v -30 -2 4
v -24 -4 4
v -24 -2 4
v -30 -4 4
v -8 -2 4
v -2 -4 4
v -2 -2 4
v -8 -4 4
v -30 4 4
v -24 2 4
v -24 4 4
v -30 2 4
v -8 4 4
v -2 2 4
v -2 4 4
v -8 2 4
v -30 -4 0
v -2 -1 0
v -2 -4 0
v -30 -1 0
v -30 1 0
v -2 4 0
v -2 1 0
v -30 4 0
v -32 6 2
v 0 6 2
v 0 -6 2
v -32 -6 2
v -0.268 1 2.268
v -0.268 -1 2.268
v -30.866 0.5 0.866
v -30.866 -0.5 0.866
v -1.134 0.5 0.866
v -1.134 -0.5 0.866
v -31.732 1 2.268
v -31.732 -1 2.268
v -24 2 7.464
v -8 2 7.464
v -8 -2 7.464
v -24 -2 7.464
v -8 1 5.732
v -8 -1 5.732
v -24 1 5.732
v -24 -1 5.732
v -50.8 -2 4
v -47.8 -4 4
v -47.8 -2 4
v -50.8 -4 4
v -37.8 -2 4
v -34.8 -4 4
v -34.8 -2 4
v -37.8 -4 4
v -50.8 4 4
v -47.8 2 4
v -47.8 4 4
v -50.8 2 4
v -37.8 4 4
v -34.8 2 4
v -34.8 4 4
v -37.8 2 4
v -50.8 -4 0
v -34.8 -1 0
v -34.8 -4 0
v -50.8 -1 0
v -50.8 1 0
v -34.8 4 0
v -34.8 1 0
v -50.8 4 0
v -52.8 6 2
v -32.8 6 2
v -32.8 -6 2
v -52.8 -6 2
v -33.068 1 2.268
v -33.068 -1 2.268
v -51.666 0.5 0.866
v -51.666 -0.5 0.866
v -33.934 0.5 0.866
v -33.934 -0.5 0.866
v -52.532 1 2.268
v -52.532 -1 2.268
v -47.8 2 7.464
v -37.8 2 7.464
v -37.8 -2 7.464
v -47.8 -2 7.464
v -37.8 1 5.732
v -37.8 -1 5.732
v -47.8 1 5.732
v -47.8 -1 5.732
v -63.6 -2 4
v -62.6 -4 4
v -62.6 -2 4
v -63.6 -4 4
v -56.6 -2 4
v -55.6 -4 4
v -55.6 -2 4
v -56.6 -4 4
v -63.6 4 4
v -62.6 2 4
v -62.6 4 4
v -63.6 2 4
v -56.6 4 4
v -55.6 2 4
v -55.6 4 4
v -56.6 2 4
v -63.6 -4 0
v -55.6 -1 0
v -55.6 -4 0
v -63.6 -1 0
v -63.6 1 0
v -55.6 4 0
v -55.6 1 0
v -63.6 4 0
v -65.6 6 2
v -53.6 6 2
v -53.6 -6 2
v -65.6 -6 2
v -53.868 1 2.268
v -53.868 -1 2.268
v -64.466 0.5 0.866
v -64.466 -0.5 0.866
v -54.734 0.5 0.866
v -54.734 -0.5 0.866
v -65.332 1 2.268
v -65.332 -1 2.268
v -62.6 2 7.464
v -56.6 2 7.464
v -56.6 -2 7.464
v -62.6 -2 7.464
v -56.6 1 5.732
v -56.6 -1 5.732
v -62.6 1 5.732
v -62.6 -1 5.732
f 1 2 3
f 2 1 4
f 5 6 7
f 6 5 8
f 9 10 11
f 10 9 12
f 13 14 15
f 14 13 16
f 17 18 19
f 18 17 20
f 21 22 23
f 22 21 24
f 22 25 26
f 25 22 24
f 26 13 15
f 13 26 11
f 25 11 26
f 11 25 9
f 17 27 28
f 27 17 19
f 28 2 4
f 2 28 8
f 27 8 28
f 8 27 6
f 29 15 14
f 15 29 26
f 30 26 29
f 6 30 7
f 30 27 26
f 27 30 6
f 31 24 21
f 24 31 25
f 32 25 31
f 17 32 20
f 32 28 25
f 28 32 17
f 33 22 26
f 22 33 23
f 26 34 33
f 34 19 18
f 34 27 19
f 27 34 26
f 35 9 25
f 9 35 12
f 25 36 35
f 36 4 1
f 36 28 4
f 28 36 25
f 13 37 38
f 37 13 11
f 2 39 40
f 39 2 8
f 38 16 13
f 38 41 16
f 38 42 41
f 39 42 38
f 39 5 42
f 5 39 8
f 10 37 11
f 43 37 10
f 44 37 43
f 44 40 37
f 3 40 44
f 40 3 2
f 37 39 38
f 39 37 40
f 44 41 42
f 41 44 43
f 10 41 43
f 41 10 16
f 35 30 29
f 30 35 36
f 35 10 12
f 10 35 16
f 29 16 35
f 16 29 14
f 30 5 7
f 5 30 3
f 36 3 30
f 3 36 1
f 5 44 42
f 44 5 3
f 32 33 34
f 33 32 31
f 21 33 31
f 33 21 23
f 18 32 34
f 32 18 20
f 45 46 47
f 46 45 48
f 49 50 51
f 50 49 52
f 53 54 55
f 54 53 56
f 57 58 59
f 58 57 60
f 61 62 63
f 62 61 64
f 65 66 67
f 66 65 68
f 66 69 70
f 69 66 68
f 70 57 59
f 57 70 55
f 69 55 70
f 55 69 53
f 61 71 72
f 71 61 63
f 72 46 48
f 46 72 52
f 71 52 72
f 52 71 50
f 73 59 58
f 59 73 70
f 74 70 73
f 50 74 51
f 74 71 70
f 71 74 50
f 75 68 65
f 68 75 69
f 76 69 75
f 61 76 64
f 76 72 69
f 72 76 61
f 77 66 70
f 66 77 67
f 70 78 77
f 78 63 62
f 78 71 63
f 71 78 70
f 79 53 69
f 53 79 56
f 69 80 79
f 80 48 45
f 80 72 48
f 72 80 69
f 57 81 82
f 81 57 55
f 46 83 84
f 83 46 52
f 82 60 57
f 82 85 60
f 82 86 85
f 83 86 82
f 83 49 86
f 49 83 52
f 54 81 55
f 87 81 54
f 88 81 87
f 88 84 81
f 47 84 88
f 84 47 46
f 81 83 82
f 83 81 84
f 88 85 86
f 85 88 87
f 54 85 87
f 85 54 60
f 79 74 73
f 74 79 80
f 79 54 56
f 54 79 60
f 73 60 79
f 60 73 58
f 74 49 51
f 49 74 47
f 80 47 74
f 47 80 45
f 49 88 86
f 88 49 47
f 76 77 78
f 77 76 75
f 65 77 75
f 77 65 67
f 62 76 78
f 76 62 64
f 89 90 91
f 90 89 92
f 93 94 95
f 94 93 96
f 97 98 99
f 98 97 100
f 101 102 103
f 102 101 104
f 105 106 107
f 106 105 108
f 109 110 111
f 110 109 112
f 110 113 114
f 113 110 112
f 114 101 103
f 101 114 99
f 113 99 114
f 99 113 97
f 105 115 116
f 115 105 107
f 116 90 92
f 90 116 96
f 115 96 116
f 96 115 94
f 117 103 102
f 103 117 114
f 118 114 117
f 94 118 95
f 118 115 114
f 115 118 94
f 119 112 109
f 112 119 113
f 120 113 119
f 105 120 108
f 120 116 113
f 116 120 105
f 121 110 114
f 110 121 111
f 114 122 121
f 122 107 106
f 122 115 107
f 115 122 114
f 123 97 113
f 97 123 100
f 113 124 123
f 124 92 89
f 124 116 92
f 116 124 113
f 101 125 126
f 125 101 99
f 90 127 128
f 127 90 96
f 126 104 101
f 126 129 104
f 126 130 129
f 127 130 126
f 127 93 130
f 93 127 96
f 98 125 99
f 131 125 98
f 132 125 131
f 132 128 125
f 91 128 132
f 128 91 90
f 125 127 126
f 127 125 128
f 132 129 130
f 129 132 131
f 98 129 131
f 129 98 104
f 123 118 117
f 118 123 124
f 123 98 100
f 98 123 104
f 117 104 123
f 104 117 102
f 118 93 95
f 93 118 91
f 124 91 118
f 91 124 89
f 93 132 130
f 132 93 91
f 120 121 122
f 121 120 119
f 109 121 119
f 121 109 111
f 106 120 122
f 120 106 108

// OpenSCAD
// Jointed finger for printing on fabric substrate.

module joint1(l=8.0,d=3.0) {
 difference() {
  union() {
   intersection() {
    translate([-d/2,0,0]) cube(size=[d,l,d/3],center=false);
    translate([0,0,0.5*d/3])
     rotate([0,45,0]) cube(size=[sqrt(2)*d/2,2*l,sqrt(2)*d/2],center=true);
    translate([0,l/2,0.5*d/3])
     rotate([45,0,0]) cube(size=[2*d,sqrt(2)*l/2,sqrt(2)*l/2],center=true);
   }
   translate([0,l/2,d/3]) rotate([90,0,0])
     cylinder($fn=6,r=d/3,h=l/2,center=true);
  }
  translate([0,-0.1,d/3]) rotate([-90,0,0]) 
    cylinder($fn=6,r=d/6,h=l+0.2,center=false);
  translate([0,-0.1,0]) rotate([-90,0,0])
    cylinder($fn=6,r=d/12,h=l+0.2,center=false);
 }
}

module joint2(l=5.0,d=3.0) {
 difference() {
  union() {
   intersection() {
    translate([-d/2,0,0]) cube(size=[d,l,d/3],center=false);
    translate([0,0,0.5*d/3])
     rotate([0,45,0]) cube(size=[sqrt(2)*d/2,2*l,sqrt(2)*d/2],center=true);
    translate([0,l/2,0.5*d/3])
     rotate([45,0,0]) cube(size=[2*d,sqrt(2)*l/2,sqrt(2)*l/2],center=true);
   }
   translate([0,l/2,d/3]) rotate([90,0,0])
     cylinder($fn=6,r=d/3,h=l/2,center=true);
  }
  translate([0,-0.1,d/3]) rotate([-90,0,0]) 
    cylinder($fn=6,r=d/6,h=l+0.2,center=false);
  translate([0,-0.1,0]) rotate([-90,0,0])
    cylinder($fn=6,r=d/12,h=l+0.2,center=false);
 }
}

module joint3(l=3.0,d=3.0) {
 difference() {
  union() {
   intersection() {
    translate([-d/2,0,0]) cube(size=[d,l,d/3],center=false);
    translate([0,0,0.5*d/3])
     rotate([0,45,0]) cube(size=[sqrt(2)*d/2,2*l,sqrt(2)*d/2],center=true);
    translate([0,l/2,0.5*d/3])
     rotate([45,0,0]) cube(size=[2*d,sqrt(2)*l/2,sqrt(2)*l/2],center=true);
   }
   translate([0,l/2,d/3]) rotate([90,0,0])
     cylinder($fn=6,r=d/3,h=l/2,center=true);
  }
  translate([0,-0.1,d/3]) rotate([-90,0,0])
    cylinder($fn=6,r=d/6,h=l+0.2,center=false);
  translate([0,-0.1,0]) rotate([-90,0,0])
    cylinder($fn=6,r=d/12,h=l+0.2,center=false);
 }
}

module finger(l=8+5+3,d=3.0,s=0.2) {
  joint1(l=8*l/16,d=d);
  translate([0,(8+s)*l/16,0]) {
    joint2(l=5*l/16,d=d);
    translate([0,(5+s)*l/16,0])
      joint3(l=3*l/16,d=d);
  }
}

module hand(finger_l=32,finger_d=6.0) {
  translate([-1.5*(finger_d+2.0),5.0,0]) finger(l=finger_l,d=finger_d);
  translate([-0.5*(finger_d+2.0),5.0,0]) finger(l=finger_l,d=finger_d);
  translate([0.5*(finger_d+2.0),5.0,0]) finger(l=finger_l,d=finger_d);
  translate([1.5*(finger_d+2.0),5.0,0]) finger(l=finger_l,d=finger_d);
}

rotate([0,0,90]) finger(l=64,d=12.0);

// hand();
